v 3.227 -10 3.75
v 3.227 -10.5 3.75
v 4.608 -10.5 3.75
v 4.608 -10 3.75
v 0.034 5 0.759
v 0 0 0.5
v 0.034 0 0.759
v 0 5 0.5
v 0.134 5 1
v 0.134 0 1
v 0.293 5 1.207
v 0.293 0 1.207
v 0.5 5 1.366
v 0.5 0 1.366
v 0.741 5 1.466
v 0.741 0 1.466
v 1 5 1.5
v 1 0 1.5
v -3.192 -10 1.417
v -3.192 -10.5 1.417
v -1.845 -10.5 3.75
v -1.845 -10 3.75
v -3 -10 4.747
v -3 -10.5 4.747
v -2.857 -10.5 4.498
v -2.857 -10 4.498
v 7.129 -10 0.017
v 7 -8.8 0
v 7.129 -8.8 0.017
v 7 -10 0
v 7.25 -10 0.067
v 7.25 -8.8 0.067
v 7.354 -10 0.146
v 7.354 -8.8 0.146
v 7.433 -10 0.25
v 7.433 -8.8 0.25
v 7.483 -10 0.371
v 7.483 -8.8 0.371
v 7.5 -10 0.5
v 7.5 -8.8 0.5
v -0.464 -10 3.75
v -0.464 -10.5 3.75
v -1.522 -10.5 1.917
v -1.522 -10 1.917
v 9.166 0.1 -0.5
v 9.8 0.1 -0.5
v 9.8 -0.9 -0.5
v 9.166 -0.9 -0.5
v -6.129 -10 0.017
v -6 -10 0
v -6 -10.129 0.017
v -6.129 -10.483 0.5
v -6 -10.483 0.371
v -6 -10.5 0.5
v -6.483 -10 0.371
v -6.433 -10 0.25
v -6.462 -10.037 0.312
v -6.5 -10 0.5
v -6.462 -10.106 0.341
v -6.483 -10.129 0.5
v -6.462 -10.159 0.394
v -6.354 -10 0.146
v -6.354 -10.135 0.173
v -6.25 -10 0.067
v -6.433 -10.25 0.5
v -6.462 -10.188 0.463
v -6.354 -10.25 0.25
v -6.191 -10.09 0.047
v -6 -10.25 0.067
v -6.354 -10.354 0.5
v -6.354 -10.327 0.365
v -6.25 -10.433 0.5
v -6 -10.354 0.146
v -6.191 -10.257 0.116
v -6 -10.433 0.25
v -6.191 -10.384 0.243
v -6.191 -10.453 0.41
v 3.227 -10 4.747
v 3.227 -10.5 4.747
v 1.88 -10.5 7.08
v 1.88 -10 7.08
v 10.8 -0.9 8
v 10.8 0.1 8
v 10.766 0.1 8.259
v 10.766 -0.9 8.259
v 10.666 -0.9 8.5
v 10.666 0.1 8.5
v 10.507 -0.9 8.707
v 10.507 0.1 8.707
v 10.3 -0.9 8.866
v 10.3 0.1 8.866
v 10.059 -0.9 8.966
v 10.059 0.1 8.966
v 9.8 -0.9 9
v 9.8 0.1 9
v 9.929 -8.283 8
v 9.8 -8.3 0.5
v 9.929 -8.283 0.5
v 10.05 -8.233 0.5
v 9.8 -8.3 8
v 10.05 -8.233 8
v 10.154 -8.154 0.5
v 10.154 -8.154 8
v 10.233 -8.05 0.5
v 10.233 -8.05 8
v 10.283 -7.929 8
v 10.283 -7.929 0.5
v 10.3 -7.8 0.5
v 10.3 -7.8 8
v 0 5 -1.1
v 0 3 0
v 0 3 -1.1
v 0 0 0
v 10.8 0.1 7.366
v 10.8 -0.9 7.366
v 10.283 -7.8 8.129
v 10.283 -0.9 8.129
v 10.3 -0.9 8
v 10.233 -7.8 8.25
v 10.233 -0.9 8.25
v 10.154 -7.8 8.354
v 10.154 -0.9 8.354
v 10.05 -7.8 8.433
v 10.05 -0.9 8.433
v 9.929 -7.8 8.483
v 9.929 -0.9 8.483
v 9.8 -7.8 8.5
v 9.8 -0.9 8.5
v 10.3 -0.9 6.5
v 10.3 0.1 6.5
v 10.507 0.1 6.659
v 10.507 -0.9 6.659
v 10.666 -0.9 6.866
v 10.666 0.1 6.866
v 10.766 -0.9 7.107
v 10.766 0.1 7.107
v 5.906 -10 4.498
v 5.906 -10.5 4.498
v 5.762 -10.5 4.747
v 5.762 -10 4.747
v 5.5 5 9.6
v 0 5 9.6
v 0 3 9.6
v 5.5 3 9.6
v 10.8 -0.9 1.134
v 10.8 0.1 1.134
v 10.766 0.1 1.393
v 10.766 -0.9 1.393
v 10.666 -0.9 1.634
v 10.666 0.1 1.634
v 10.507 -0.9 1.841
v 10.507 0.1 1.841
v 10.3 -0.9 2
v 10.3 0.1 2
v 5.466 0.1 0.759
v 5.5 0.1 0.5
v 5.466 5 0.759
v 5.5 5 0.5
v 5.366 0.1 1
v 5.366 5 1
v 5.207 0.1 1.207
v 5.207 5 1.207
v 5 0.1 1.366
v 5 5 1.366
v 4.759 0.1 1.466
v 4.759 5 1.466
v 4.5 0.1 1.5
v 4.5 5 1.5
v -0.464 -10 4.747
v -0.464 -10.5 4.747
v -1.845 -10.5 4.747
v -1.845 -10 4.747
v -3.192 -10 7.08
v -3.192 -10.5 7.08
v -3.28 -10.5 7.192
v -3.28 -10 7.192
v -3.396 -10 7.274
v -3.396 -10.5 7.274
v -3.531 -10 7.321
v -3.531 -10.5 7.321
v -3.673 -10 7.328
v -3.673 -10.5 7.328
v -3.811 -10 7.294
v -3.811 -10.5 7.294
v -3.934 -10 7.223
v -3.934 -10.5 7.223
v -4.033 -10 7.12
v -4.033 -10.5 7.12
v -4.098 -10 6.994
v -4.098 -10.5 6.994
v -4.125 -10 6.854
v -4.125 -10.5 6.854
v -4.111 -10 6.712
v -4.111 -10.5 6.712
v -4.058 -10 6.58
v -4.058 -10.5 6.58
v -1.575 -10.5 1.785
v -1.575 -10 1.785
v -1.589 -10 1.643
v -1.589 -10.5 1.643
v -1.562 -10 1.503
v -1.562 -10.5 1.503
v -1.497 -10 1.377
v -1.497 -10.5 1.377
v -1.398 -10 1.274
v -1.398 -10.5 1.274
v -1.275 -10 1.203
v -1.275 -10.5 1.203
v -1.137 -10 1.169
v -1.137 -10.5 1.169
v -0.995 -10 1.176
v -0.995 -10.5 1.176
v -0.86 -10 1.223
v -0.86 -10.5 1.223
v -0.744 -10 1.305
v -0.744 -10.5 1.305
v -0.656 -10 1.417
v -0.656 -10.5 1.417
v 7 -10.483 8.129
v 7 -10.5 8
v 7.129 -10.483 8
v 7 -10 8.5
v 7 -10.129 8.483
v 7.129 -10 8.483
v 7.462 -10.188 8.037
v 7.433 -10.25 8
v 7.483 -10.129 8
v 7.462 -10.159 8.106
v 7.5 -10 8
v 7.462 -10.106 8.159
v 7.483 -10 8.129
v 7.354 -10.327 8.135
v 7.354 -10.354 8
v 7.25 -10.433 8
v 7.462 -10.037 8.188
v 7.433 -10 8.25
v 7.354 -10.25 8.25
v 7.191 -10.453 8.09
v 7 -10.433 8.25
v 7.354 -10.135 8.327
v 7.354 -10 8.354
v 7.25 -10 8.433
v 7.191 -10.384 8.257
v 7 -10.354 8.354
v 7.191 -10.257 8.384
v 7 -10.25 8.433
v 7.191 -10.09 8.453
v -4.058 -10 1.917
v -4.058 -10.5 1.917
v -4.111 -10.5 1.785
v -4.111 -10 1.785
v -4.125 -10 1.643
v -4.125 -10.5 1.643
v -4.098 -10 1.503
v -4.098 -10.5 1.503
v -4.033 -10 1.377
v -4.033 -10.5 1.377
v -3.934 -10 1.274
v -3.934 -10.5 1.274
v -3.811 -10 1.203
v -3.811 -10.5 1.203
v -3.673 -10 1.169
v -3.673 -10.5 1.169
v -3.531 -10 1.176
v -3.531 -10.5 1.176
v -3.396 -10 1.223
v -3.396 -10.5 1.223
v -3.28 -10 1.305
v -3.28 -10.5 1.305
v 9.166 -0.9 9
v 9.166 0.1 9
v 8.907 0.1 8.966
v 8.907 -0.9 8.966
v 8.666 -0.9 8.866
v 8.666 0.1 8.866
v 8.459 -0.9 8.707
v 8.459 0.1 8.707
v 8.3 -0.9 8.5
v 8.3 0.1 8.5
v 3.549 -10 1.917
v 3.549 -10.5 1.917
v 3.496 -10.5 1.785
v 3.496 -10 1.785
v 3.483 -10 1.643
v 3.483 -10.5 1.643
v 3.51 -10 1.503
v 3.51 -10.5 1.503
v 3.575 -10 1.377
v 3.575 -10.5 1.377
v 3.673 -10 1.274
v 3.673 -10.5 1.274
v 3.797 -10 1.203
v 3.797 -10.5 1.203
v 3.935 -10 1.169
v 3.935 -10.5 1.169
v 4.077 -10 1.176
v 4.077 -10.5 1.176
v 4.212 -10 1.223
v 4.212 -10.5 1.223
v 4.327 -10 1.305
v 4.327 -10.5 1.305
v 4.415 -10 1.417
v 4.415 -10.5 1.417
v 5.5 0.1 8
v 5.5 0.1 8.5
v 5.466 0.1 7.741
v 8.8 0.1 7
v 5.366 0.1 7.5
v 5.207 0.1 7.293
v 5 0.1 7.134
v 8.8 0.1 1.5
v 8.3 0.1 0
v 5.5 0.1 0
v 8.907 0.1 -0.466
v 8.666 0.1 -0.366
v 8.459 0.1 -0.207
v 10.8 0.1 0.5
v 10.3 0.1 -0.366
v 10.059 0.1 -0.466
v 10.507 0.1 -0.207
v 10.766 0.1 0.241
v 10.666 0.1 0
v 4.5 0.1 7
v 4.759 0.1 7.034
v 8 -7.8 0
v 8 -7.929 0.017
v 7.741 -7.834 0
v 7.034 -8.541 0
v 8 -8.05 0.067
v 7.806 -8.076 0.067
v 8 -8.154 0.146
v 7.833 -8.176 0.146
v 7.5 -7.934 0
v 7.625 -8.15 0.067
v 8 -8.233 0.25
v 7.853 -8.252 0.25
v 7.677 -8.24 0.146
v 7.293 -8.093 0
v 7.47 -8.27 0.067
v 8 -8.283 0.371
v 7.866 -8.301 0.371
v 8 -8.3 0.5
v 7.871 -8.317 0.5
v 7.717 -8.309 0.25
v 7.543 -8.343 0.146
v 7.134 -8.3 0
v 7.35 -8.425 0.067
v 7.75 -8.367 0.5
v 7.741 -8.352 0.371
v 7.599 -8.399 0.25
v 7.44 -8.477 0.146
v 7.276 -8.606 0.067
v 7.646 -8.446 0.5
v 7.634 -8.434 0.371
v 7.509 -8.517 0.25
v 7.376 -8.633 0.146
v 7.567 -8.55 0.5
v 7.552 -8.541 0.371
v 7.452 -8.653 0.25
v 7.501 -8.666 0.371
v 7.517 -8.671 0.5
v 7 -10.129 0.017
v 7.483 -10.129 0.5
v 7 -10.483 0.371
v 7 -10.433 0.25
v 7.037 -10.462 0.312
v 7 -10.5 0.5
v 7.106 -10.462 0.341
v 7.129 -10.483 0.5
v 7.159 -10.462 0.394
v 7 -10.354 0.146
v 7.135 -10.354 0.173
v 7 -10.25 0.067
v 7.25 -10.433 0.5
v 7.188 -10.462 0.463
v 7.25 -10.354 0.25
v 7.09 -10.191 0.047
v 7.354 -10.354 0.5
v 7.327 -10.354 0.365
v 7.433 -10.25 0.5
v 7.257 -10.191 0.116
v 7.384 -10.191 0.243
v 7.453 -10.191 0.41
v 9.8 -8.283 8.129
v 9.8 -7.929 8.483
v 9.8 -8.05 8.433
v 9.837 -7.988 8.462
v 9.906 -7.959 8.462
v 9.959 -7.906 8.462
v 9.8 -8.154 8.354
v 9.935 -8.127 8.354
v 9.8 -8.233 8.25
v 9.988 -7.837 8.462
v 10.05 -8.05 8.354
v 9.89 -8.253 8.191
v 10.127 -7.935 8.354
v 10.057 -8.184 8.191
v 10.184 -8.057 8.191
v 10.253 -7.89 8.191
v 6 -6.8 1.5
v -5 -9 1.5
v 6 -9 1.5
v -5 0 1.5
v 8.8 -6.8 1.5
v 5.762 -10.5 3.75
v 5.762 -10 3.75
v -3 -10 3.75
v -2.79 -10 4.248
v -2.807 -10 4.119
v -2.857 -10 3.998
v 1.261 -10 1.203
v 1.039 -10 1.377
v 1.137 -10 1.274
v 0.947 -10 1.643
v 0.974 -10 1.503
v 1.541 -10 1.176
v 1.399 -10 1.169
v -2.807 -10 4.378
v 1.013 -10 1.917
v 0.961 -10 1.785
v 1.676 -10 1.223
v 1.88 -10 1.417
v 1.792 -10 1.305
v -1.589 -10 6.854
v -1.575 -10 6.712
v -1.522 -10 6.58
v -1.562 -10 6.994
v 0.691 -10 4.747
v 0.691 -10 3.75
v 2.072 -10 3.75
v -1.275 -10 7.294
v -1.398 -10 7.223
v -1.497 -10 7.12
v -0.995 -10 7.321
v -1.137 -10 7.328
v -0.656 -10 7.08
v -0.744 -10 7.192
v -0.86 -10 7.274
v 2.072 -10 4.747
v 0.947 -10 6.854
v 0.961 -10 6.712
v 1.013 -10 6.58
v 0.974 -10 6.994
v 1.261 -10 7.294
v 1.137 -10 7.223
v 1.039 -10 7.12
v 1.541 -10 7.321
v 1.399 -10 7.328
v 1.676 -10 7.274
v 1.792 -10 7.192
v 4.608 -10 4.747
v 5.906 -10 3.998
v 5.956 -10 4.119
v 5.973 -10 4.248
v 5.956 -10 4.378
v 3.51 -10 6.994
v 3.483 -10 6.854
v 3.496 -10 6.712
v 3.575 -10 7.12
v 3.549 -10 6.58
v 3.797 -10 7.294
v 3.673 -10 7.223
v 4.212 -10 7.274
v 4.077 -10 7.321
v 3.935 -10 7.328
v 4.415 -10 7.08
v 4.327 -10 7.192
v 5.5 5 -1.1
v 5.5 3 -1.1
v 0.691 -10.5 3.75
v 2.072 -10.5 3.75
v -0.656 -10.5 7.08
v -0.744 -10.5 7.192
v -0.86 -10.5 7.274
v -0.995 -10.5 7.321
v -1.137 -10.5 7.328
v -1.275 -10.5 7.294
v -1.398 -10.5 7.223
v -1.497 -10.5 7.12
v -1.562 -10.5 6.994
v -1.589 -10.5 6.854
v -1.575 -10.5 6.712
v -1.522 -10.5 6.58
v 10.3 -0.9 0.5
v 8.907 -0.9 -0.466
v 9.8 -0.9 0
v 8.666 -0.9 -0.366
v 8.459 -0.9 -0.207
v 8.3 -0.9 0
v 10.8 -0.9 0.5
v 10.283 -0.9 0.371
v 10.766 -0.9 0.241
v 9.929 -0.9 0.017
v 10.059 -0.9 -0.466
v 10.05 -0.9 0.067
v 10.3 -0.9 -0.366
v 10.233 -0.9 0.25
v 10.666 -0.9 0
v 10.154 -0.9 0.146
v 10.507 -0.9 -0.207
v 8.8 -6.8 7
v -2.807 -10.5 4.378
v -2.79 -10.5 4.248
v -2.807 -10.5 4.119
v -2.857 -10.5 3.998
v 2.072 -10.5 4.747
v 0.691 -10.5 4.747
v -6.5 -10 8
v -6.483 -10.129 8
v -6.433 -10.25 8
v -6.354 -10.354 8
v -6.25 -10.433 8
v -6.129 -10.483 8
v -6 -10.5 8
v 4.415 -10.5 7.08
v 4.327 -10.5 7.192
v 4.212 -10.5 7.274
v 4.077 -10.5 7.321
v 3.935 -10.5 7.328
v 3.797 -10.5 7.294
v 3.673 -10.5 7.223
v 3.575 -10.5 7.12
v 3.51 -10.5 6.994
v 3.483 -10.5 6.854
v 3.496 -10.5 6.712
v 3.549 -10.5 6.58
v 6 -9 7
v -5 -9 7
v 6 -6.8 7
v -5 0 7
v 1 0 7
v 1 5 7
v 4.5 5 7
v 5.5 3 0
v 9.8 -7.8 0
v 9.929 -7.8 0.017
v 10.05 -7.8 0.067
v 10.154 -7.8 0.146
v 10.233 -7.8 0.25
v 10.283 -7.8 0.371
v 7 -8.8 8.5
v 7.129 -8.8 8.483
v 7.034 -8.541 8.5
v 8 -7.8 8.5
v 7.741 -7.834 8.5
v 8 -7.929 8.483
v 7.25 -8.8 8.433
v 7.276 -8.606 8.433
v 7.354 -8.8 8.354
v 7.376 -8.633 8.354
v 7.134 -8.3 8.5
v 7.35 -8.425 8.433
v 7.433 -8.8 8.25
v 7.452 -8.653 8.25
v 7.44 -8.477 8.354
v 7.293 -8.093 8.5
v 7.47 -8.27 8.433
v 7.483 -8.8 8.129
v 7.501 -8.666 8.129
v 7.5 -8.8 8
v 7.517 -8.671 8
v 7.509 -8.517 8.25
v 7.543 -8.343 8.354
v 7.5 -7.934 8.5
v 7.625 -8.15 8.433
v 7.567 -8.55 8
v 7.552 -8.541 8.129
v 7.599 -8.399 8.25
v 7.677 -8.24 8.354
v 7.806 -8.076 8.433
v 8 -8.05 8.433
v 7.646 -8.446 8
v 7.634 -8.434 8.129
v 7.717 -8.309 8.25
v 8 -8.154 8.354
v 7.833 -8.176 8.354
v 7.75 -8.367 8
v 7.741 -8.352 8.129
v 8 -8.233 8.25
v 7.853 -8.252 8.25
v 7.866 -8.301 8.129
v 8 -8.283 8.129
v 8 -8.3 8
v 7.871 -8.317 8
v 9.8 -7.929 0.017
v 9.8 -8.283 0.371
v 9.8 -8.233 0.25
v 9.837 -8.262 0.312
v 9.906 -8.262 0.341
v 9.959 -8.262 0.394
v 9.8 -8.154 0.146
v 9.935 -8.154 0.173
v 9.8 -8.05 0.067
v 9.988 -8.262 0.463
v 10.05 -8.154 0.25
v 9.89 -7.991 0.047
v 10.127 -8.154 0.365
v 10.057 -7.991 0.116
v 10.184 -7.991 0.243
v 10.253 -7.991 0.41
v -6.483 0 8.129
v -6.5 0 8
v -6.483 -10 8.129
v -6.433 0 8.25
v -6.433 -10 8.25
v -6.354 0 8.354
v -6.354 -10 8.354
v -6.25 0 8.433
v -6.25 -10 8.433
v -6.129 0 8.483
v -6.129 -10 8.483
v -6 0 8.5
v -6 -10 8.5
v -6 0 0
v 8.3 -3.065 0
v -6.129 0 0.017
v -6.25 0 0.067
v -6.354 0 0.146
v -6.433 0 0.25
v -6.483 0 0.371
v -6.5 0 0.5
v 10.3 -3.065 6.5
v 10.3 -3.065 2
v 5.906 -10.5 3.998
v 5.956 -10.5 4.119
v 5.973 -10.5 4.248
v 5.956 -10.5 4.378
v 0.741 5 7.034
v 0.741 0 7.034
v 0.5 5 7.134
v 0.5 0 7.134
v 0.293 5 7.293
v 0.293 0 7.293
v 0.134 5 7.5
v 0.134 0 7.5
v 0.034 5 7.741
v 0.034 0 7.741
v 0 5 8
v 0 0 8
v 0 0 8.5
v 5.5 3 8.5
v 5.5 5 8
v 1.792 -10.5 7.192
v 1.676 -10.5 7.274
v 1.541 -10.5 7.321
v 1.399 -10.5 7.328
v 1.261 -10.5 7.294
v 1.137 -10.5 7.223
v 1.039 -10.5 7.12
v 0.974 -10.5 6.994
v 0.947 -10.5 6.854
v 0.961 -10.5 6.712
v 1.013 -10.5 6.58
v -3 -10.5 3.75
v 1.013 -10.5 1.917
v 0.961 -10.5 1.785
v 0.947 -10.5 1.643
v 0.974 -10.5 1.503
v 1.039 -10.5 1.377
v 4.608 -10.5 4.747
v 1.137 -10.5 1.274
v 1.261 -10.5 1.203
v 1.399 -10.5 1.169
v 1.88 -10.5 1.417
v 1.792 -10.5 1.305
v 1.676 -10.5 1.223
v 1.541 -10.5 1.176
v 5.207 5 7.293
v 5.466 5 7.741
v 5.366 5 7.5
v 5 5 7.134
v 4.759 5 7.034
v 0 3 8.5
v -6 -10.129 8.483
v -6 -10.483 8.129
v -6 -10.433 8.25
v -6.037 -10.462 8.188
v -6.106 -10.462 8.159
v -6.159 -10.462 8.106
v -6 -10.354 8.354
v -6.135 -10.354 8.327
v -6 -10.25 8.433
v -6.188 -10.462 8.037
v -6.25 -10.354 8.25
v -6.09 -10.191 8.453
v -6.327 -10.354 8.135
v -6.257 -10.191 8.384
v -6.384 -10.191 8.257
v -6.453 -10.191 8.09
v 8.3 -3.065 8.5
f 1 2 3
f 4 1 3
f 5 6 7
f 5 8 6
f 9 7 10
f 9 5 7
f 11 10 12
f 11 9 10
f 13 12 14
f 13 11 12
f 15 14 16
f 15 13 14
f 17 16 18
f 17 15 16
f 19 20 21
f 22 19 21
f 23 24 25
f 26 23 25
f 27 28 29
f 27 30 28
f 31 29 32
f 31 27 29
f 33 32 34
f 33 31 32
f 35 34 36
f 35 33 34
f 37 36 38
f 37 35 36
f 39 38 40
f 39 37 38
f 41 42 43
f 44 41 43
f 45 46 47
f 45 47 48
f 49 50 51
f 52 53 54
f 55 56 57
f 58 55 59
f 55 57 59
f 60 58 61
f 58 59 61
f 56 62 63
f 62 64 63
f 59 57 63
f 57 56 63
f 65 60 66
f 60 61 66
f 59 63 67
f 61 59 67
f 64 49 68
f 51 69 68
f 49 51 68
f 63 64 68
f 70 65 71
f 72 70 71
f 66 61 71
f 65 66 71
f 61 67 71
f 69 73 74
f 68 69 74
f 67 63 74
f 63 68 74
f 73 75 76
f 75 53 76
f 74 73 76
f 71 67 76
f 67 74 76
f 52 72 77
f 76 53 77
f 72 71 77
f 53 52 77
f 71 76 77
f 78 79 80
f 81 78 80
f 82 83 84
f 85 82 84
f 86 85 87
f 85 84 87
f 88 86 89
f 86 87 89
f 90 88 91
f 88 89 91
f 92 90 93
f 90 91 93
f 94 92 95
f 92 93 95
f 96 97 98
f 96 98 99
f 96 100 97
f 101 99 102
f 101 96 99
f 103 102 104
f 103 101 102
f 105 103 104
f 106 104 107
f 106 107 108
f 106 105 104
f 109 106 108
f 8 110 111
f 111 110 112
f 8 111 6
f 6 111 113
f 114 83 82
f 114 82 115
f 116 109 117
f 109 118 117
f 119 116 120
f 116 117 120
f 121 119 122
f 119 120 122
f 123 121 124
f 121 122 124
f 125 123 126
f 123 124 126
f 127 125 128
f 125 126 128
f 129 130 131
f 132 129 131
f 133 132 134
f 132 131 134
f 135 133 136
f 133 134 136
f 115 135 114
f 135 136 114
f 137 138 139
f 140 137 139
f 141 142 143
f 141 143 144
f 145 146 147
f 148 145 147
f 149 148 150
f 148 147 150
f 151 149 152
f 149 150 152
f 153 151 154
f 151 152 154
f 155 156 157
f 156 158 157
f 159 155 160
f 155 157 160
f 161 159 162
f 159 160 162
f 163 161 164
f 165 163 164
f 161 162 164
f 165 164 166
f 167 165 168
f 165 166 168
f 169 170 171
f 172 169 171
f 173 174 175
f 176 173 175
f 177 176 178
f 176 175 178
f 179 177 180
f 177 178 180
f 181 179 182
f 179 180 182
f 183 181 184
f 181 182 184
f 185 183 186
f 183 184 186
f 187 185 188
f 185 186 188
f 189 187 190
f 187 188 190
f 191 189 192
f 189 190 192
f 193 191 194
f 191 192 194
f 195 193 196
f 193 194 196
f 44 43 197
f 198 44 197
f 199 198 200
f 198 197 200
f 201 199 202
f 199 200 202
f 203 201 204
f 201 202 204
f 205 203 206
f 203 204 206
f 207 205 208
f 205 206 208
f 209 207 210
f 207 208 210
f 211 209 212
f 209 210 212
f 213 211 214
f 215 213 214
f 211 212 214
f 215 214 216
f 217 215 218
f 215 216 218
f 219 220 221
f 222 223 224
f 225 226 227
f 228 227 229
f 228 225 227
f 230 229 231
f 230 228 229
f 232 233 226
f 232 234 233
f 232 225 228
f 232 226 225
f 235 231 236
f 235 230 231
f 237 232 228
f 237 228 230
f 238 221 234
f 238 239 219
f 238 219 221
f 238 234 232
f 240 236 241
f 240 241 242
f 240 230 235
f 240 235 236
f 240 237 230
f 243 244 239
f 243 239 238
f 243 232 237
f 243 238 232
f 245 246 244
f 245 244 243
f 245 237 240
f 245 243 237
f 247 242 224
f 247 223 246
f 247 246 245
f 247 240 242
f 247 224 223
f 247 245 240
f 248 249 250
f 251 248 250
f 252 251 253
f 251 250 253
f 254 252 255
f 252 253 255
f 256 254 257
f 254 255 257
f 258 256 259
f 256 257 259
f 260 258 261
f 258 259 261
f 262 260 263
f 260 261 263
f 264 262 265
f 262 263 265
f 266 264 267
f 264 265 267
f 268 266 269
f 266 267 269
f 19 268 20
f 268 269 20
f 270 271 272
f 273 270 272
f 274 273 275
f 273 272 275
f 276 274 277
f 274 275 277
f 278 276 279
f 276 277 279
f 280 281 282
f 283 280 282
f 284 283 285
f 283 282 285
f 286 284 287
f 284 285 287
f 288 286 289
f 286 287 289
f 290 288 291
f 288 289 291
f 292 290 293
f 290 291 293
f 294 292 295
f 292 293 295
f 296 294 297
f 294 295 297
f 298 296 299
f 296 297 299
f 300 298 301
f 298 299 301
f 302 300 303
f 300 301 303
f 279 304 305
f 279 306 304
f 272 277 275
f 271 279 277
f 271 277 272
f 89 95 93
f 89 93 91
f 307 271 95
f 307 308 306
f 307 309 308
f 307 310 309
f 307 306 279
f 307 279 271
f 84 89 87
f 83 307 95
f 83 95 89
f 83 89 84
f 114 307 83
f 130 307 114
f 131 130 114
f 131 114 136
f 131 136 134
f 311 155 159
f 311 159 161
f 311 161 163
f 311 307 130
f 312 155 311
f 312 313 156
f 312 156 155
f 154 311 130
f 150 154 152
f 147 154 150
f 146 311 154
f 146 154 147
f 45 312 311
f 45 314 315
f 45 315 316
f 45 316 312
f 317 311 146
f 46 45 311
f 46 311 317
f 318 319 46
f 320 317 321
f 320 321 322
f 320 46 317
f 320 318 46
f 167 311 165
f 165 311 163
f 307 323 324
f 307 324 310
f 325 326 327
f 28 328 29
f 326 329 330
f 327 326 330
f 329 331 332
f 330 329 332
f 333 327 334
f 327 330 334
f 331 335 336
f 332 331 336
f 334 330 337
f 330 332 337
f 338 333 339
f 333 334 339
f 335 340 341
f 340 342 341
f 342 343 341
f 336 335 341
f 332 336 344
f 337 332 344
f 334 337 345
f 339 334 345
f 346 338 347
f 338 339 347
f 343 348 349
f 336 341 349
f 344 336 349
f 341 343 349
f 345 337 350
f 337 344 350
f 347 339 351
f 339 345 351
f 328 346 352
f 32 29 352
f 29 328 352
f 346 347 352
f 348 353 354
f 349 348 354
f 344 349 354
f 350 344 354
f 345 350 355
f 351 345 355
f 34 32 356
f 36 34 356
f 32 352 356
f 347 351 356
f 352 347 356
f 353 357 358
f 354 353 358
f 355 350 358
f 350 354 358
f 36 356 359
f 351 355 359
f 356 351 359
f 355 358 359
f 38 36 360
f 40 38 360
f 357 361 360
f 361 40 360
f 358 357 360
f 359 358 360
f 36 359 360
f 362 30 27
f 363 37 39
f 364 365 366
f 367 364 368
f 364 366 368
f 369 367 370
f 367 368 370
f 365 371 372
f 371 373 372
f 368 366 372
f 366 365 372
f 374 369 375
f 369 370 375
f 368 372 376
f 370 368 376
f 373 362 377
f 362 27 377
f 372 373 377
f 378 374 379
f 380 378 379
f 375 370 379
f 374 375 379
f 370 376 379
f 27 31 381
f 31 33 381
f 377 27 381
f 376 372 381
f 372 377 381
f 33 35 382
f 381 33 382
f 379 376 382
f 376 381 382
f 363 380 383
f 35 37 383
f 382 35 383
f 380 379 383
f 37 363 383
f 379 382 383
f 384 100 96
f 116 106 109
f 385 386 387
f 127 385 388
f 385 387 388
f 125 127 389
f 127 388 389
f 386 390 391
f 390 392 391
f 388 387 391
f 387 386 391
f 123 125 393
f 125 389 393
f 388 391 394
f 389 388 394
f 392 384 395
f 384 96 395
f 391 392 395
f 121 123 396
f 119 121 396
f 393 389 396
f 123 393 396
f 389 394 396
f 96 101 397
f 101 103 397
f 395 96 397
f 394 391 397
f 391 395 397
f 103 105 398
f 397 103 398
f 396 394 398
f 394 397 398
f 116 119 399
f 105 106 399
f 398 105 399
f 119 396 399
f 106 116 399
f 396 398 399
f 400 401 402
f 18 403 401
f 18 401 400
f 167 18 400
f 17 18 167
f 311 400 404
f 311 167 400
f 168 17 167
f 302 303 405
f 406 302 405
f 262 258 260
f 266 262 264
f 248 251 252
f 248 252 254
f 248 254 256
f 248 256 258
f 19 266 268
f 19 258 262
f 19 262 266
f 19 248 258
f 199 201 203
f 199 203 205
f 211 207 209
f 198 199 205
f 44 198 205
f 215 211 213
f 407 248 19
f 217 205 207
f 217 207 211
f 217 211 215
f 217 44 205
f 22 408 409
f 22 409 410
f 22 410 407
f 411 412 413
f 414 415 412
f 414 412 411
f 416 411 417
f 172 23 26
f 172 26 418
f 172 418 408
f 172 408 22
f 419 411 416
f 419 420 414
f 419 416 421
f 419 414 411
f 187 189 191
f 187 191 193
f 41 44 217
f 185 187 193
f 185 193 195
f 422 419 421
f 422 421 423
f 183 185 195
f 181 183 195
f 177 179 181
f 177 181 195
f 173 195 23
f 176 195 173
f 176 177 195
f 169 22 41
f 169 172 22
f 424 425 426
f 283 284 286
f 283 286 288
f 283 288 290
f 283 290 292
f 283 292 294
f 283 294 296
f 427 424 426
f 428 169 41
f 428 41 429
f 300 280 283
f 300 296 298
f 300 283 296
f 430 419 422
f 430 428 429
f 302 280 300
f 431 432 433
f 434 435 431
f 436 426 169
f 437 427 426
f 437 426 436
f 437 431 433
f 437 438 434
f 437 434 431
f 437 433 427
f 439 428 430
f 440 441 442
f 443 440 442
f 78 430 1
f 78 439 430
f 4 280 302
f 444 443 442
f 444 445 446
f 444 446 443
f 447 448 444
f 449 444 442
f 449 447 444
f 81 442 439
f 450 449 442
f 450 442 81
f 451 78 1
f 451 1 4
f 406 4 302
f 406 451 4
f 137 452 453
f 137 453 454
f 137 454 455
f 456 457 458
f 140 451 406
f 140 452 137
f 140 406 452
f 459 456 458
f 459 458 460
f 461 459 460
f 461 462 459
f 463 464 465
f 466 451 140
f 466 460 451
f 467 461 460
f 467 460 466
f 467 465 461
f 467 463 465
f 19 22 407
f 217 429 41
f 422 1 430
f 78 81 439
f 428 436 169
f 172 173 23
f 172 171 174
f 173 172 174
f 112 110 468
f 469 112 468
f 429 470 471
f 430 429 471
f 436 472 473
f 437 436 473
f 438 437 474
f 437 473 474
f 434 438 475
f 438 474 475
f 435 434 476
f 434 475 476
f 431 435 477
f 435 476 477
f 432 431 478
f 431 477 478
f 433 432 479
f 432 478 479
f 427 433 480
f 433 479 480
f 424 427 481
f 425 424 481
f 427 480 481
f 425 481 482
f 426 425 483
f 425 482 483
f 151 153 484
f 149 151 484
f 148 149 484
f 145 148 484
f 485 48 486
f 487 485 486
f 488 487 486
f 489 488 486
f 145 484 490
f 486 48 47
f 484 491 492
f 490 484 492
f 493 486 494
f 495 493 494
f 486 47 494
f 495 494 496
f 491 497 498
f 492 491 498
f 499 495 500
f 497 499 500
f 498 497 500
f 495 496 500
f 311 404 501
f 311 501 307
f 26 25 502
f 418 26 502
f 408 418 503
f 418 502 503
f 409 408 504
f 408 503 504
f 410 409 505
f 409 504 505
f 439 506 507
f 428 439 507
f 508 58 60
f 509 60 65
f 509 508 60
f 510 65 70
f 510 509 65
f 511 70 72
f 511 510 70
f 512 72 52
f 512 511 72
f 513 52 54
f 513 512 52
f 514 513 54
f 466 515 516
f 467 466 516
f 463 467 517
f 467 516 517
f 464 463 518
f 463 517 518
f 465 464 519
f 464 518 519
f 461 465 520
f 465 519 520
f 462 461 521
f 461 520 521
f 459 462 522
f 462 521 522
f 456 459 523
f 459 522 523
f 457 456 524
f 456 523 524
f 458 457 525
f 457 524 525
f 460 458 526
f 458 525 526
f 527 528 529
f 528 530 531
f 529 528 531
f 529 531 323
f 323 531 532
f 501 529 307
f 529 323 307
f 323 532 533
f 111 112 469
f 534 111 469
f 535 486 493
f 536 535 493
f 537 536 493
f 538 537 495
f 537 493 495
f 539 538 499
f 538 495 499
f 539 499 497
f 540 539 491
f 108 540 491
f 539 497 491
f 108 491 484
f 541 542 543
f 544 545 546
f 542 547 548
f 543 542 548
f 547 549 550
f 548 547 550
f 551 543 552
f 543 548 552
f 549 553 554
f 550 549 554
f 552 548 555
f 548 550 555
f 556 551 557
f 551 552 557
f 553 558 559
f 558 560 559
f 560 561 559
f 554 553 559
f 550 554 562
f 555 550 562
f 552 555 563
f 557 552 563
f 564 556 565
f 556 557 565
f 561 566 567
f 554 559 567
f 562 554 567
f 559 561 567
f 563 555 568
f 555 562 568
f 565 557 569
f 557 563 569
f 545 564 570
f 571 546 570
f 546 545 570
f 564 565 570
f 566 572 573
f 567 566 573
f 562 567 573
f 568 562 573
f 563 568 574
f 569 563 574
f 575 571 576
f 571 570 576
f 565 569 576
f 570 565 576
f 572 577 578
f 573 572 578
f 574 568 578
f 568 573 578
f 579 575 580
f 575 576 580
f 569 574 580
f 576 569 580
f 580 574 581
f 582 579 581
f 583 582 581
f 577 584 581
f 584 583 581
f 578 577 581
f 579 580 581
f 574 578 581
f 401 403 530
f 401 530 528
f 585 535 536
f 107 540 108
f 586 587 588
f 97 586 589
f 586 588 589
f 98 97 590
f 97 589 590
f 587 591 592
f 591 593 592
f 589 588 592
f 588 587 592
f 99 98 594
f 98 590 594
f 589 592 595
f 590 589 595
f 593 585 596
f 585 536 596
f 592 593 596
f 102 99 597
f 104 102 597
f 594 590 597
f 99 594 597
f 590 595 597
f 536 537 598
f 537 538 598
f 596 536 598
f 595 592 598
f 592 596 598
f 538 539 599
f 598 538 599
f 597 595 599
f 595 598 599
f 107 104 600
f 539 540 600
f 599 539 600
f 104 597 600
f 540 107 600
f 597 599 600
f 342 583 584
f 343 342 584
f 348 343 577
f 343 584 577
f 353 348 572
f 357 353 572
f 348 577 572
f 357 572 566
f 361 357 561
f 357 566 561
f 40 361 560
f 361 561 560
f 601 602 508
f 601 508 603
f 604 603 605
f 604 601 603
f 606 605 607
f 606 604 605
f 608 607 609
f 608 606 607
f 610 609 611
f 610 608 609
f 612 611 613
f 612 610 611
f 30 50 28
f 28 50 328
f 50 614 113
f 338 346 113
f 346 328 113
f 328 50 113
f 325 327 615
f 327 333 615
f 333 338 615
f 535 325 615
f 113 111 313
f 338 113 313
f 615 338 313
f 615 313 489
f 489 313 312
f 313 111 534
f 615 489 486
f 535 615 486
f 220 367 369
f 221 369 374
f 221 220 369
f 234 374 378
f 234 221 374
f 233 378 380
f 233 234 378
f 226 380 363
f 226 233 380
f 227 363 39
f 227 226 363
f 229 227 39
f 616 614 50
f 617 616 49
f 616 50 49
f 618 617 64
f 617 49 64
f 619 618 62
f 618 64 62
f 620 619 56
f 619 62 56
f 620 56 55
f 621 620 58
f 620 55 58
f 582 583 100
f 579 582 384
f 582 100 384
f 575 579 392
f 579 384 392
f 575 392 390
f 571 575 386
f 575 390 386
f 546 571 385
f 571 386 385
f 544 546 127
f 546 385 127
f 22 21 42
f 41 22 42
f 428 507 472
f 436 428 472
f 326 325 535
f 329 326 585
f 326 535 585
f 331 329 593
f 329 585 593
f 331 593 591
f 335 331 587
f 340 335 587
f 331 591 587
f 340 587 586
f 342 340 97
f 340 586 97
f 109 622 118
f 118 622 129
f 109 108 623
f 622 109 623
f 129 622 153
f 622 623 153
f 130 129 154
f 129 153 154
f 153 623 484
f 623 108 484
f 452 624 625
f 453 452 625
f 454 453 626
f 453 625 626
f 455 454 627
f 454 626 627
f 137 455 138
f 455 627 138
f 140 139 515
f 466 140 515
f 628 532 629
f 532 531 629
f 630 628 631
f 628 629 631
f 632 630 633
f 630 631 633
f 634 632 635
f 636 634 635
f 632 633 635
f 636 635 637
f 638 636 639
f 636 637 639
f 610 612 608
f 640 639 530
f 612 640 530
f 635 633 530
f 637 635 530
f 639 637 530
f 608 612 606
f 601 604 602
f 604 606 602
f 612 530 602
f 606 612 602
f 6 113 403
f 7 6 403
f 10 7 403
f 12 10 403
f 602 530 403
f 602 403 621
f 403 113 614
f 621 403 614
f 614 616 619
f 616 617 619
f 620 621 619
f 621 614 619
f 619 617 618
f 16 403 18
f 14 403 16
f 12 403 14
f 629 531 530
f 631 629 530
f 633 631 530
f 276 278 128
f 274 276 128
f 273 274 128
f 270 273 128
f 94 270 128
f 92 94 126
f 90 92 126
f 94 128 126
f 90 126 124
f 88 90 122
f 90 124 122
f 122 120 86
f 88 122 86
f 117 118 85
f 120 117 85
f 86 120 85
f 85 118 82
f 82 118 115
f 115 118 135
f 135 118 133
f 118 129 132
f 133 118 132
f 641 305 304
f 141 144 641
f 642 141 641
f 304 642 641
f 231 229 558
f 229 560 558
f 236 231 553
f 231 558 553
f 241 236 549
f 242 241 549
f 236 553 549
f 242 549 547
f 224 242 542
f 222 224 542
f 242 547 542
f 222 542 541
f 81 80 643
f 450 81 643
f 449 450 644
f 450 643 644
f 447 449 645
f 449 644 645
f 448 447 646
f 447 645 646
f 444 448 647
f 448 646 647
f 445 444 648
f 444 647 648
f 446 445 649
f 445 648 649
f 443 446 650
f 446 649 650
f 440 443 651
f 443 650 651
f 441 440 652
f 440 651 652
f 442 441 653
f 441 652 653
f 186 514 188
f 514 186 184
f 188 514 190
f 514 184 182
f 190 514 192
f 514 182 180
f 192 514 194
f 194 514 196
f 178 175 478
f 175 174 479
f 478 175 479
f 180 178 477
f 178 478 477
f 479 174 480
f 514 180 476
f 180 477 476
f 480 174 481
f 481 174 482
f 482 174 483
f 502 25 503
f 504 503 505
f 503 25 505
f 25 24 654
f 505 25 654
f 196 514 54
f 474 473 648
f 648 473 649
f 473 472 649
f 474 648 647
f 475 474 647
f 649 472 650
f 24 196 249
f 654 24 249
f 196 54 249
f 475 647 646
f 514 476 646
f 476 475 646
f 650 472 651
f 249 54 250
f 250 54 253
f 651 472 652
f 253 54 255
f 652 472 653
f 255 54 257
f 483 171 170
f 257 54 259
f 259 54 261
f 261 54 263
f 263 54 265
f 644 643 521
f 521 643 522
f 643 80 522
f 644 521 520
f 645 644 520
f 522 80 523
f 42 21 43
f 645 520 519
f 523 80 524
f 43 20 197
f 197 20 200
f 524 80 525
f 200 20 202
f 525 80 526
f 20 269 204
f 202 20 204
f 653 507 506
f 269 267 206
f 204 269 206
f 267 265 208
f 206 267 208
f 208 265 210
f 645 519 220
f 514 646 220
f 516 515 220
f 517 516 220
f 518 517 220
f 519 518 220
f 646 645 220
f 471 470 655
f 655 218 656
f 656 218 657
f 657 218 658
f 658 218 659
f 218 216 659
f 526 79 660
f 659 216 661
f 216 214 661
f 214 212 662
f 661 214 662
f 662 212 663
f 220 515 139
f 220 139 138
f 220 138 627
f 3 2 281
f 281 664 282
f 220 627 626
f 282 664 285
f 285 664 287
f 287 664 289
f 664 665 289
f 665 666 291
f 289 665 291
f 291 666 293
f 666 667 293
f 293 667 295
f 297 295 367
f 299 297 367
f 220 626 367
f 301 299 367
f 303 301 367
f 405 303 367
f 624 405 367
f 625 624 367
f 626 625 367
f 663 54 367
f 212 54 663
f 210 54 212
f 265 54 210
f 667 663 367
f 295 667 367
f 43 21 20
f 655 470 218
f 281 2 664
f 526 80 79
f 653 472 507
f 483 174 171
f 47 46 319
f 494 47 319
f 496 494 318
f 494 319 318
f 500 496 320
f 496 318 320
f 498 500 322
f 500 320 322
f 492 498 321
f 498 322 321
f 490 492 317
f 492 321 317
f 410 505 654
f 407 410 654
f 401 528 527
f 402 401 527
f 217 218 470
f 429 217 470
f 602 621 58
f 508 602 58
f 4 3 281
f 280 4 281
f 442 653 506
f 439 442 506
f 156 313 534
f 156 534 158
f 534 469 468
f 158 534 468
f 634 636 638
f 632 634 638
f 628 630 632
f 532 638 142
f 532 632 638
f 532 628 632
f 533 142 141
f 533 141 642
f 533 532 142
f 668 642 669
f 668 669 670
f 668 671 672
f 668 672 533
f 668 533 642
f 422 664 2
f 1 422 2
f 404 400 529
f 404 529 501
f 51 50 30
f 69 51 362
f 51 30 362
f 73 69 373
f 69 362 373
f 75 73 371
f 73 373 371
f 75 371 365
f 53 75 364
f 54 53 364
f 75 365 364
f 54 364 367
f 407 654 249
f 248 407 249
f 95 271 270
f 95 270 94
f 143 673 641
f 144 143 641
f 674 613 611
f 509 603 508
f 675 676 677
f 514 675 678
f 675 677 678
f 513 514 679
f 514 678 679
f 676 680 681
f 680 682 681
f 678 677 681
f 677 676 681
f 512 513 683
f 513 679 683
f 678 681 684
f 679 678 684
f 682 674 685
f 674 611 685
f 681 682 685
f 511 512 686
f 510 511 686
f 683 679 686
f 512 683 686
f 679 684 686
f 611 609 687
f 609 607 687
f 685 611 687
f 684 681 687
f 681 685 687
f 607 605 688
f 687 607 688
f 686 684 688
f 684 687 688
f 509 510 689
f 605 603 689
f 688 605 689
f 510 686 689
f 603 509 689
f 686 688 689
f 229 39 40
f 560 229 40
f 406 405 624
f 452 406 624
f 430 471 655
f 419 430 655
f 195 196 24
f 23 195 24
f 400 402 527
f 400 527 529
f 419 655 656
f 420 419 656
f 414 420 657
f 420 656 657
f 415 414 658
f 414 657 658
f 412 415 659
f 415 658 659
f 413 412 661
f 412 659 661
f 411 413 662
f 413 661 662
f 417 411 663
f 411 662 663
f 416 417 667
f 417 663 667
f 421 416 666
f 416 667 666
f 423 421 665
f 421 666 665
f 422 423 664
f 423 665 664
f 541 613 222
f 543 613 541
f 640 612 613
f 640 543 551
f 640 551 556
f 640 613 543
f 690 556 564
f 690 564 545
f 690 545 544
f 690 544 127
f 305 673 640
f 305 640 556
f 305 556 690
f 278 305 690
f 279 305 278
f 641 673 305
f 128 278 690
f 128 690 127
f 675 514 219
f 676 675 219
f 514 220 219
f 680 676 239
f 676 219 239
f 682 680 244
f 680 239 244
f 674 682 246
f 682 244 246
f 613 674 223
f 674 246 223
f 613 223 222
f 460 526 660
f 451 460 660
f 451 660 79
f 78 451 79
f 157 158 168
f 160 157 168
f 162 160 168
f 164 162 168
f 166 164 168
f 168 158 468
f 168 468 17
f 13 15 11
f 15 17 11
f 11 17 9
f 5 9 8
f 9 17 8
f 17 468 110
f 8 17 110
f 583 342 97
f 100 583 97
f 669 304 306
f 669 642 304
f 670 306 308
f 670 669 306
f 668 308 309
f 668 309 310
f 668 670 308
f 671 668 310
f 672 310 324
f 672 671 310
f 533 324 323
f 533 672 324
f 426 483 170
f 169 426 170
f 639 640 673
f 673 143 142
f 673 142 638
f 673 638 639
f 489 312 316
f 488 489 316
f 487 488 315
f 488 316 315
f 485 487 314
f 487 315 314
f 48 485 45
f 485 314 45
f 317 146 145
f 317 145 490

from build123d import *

# Parameters (mm, degrees)
BOSS_EXTRUDE1_DEPTH = 8.5
SHELL1_T            = -1.5
SKETCH3_W           = 14
SKETCH3_H           = 8.5
BOSS_EXTRUDE2_DEPTH = 1.5
CUT_EXTRUDE1_DEPTH  = 0.5
BOSS_EXTRUDE4_DEPTH = 1
FILLET2_R           = 1
SKETCH6_W           = 5.5
SKETCH6_H           = 2.6
BOSS_EXTRUDE5_DEPTH = 2
FILLET3_R           = 0.5
FILLET4_R           = 1


with BuildPart() as part:
    # Sketch1 → Boss-Extrude1 (new body)
    with BuildSketch(Plane.XY):
        Polygon((0, 0), (-6.5, 0), (-6.5, -10.5), (7.5, -10.5), (7.5, -8.3), (10.3, -8.3), (10.3, 0.1), (5.5, 0.1), (5.5, 5), (0, 5), align=None)
    extrude(amount=BOSS_EXTRUDE1_DEPTH)

    # Shell1
    shell1_openings = [part.faces().sort_by_distance(p)[0] for p in [
        (2.75, 5, 4.25),
        (5.5, 2.55, 4.25),
        (7.9, 0.1, 4.25),
        (0.5, -10.5, 4.25),
        (-3.25, 0, 4.25),
        (0, 2.5, 4.25),
    ]]
    offset(amount=SHELL1_T, openings=shell1_openings, kind=Kind.INTERSECTION)

    # Sketch3 → Boss-Extrude2 (add)
    with BuildSketch(Plane.XZ.offset(10.5)):
        with Locations((0.5, 4.25)):
            Rectangle(SKETCH3_W, SKETCH3_H)
    extrude(amount=-BOSS_EXTRUDE2_DEPTH)

    # Sketch4 → Cut-Extrude1 (cut)
    with BuildSketch(Plane.XZ.offset(10.5)):
        with BuildLine():
            Line((-3, 3.75), (-4.058316713, 1.916941682))
            ThreePointArc((-4.058316713, 1.916941682), (-3.875304011, 1.23392898), (-3.192291309, 1.416941682))
            Line((-3.192291309, 1.416941682), (-1.845299462, 3.75))
            Line((-1.845299462, 3.75), (-0.464100143, 3.75))
            Line((-0.464100143, 3.75), (-1.522416856, 1.916941682))
            ThreePointArc((-1.522416856, 1.916941682), (-1.339404154, 1.23392898), (-0.656391453, 1.416941682))
            Line((-0.656391453, 1.416941682), (0.690600395, 3.75))
            Line((0.690600395, 3.75), (2.071799714, 3.75))
            Line((2.071799714, 3.75), (1.013483001, 1.916941682))
            ThreePointArc((1.013483001, 1.916941682), (1.196495702, 1.23392898), (1.879508404, 1.416941682))
            Line((1.879508404, 1.416941682), (3.226500252, 3.75))
            Line((3.226500252, 3.75), (4.607699571, 3.75))
            Line((4.607699571, 3.75), (3.549382857, 1.916941682))
            ThreePointArc((3.549382857, 1.916941682), (3.732395559, 1.23392898), (4.415408261, 1.416941682))
            Line((4.415408261, 1.416941682), (5.762400109, 3.75))
            Line((5.762400109, 3.75), (5.90585335, 3.998468302))
            ThreePointArc((5.90585335, 3.998468302), (5.972840648, 4.248468302), (5.90585335, 4.498468302))
            Line((5.90585335, 4.498468302), (5.762400109, 4.746936604))
            Line((5.762400109, 4.746936604), (4.415408261, 7.079994922))
            ThreePointArc((4.415408261, 7.079994922), (3.732395559, 7.263007624), (3.549382857, 6.579994922))
            Line((3.549382857, 6.579994922), (4.607699571, 4.746936604))
            Line((4.607699571, 4.746936604), (3.226500252, 4.746936604))
            Line((3.226500252, 4.746936604), (1.879508404, 7.079994922))
            ThreePointArc((1.879508404, 7.079994922), (1.196495702, 7.263007624), (1.013483001, 6.579994922))
            Line((1.013483001, 6.579994922), (2.071799714, 4.746936604))
            Line((2.071799714, 4.746936604), (0.690600395, 4.746936604))
            Line((0.690600395, 4.746936604), (-0.656391453, 7.079994922))
            ThreePointArc((-0.656391453, 7.079994922), (-1.339404154, 7.263007624), (-1.522416856, 6.579994922))
            Line((-1.522416856, 6.579994922), (-0.464100143, 4.746936604))
            Line((-0.464100143, 4.746936604), (-1.845299462, 4.746936604))
            Line((-1.845299462, 4.746936604), (-3.192291309, 7.079994922))
            ThreePointArc((-3.192291309, 7.079994922), (-3.875304011, 7.263007624), (-4.058316713, 6.579994922))
            Line((-4.058316713, 6.579994922), (-3, 4.746936604))
            Line((-3, 4.746936604), (-2.856546759, 4.498468302))
            ThreePointArc((-2.856546759, 4.498468302), (-2.789559461, 4.248468302), (-2.856546759, 3.998468302))
            Line((-2.856546759, 3.998468302), (-3, 3.75))
        make_face()
    extrude(amount=-CUT_EXTRUDE1_DEPTH, mode=Mode.SUBTRACT)

    # Sketch5 → Boss-Extrude4 (add)
    with BuildSketch(Plane(origin=(0, 0.1, 0), x_dir=(1, 0, 0), z_dir=(0, 1, 0))):
        Polygon((10.3, 0.5), (8.3, 0.5), (8.3, 0), (10.3, 0), (10.3, -2), (10.8, -2), (10.8, 0.5), align=None)
        Polygon((10.8, -6.5), (10.3, -6.5), (10.3, -8.5), (8.3, -8.5), (8.3, -9), (10.3, -9), (10.8, -9), align=None)
    extrude(amount=-BOSS_EXTRUDE4_DEPTH)

    # Fillet2
    # the kernel refuses this fillet: 1 mm, written as the material it takes off along each edge
    with BuildSketch(Plane(origin=(8.3, 2.265063509, -0.5), x_dir=(0, 0, 1), z_dir=(0, -1, 0)), Plane(origin=(10.8, 2.265063509, 6.5), x_dir=(-1, 0, 0), z_dir=(0, -1, 0))) as fillet2_piece_1:
        with BuildLine():
            CenterArc((1, -0.866025404), FILLET2_R, 120, 60)
            Line((0, -0.866025404), (-0.02, -0.866025404))
            Line((-0.02, -0.866025404), (-0.02, 0))
            Line((-0.02, 0), (0, 0.02))
            ThreePointArc((0, 0.02), (0.25, 0.02), (0.49, 0.017320508))
            Line((0.49, 0.017320508), (0.5, 0))
        make_face()
    extrude(amount=5.330127019, mode=Mode.SUBTRACT)
    with BuildSketch(Plane(origin=(10.8, 2.265063509, 2), x_dir=(-1, 0, 0), z_dir=(0, -1, 0)), Plane(origin=(8.3, 2.265063509, 9), x_dir=(0, 0, -1), z_dir=(0, -1, 0))) as fillet2_piece_2:
        with BuildLine():
            CenterArc((1, 0.866025404), FILLET2_R, 180, 60)
            Line((0, 0.866025404), (-0.02, 0.866025404))
            Line((-0.02, 0.866025404), (-0.02, 0))
            Line((-0.02, 0), (0, -0.02))
            ThreePointArc((0, -0.02), (0.25, -0.02), (0.49, -0.017320508))
            Line((0.49, -0.017320508), (0.5, 0))
        make_face()
    extrude(amount=5.330127019, mode=Mode.SUBTRACT)
    with BuildSketch(Plane(origin=(10.8, 2.6, -0.5), x_dir=(-1, 0, 0), z_dir=(0, -1, 0))) as fillet2_piece_3:
        with BuildLine():
            CenterArc((FILLET2_R, -FILLET2_R), FILLET2_R, 90, 90)
            Line((0, -FILLET2_R), (-FILLET2_R * 0.02, -FILLET2_R))
            Line((-FILLET2_R * 0.02, -FILLET2_R), (-FILLET2_R * 0.02, FILLET2_R * 0.02))
            Line((-FILLET2_R * 0.02, FILLET2_R * 0.02), (FILLET2_R, FILLET2_R * 0.02))
            Line((FILLET2_R, FILLET2_R * 0.02), (FILLET2_R, 0))
        make_face()
    extrude(amount=6, mode=Mode.SUBTRACT)
    with BuildSketch(Plane(origin=(10.8, 2.6, 9), x_dir=(-1, 0, 0), z_dir=(0, -1, 0))) as fillet2_piece_4:
        with BuildLine():
            CenterArc((FILLET2_R, FILLET2_R), FILLET2_R, 180, 90)
            Line((0, FILLET2_R), (-FILLET2_R * 0.02, FILLET2_R))
            Line((-FILLET2_R * 0.02, FILLET2_R), (-FILLET2_R * 0.02, -FILLET2_R * 0.02))
            Line((-FILLET2_R * 0.02, -FILLET2_R * 0.02), (FILLET2_R, -FILLET2_R * 0.02))
            Line((FILLET2_R, -FILLET2_R * 0.02), (FILLET2_R, 0))
        make_face()
    extrude(amount=6, mode=Mode.SUBTRACT)

    # Sketch6 → Boss-Extrude5 (add)
    with BuildSketch(Plane(origin=(0, 5, 0), x_dir=(1, 0, 0), z_dir=(0, 1, 0))):
        with Locations((2.75, -8.3)):
            Rectangle(SKETCH6_W, SKETCH6_H)
        with Locations((2.75, -0.2)):
            Rectangle(SKETCH6_W, SKETCH6_H)
    extrude(amount=-BOSS_EXTRUDE5_DEPTH)

    # Fillet3
    fillet3_edges = [part.edges().sort_by_distance(p)[0] for p in [
        (10.3, -4.6, 0),
        (8.9, -8.3, 0),
        (7.5, -9.4, 0),
        (0.5, -10.5, 0),
        (-6.5, -5.25, 8.5),
        (-6.5, -5.25, 0),
        (0.5, -10.5, 8.5),
        (10.3, -8.3, 4.25),
        (7.5, -8.3, 4.25),
        (7.5, -10.5, 4.25),
        (-6.5, -10.5, 4.25),
        (7.5, -9.4, 8.5),
        (8.9, -8.3, 8.5),
        (10.3, -4.6, 8.5),
    ]]
    fillet(fillet3_edges, radius=FILLET3_R)

    # Fillet4
    fillet4_edges = [part.edges().sort_by_distance(p)[0] for p in [
        (0, 2.5, 1.5),
        (5.5, 2.55, 1.5),
        (0, 2.5, 7),
        (5.5, 2.55, 7),
    ]]
    fillet(fillet4_edges, radius=FILLET4_R)


solid = part.part
